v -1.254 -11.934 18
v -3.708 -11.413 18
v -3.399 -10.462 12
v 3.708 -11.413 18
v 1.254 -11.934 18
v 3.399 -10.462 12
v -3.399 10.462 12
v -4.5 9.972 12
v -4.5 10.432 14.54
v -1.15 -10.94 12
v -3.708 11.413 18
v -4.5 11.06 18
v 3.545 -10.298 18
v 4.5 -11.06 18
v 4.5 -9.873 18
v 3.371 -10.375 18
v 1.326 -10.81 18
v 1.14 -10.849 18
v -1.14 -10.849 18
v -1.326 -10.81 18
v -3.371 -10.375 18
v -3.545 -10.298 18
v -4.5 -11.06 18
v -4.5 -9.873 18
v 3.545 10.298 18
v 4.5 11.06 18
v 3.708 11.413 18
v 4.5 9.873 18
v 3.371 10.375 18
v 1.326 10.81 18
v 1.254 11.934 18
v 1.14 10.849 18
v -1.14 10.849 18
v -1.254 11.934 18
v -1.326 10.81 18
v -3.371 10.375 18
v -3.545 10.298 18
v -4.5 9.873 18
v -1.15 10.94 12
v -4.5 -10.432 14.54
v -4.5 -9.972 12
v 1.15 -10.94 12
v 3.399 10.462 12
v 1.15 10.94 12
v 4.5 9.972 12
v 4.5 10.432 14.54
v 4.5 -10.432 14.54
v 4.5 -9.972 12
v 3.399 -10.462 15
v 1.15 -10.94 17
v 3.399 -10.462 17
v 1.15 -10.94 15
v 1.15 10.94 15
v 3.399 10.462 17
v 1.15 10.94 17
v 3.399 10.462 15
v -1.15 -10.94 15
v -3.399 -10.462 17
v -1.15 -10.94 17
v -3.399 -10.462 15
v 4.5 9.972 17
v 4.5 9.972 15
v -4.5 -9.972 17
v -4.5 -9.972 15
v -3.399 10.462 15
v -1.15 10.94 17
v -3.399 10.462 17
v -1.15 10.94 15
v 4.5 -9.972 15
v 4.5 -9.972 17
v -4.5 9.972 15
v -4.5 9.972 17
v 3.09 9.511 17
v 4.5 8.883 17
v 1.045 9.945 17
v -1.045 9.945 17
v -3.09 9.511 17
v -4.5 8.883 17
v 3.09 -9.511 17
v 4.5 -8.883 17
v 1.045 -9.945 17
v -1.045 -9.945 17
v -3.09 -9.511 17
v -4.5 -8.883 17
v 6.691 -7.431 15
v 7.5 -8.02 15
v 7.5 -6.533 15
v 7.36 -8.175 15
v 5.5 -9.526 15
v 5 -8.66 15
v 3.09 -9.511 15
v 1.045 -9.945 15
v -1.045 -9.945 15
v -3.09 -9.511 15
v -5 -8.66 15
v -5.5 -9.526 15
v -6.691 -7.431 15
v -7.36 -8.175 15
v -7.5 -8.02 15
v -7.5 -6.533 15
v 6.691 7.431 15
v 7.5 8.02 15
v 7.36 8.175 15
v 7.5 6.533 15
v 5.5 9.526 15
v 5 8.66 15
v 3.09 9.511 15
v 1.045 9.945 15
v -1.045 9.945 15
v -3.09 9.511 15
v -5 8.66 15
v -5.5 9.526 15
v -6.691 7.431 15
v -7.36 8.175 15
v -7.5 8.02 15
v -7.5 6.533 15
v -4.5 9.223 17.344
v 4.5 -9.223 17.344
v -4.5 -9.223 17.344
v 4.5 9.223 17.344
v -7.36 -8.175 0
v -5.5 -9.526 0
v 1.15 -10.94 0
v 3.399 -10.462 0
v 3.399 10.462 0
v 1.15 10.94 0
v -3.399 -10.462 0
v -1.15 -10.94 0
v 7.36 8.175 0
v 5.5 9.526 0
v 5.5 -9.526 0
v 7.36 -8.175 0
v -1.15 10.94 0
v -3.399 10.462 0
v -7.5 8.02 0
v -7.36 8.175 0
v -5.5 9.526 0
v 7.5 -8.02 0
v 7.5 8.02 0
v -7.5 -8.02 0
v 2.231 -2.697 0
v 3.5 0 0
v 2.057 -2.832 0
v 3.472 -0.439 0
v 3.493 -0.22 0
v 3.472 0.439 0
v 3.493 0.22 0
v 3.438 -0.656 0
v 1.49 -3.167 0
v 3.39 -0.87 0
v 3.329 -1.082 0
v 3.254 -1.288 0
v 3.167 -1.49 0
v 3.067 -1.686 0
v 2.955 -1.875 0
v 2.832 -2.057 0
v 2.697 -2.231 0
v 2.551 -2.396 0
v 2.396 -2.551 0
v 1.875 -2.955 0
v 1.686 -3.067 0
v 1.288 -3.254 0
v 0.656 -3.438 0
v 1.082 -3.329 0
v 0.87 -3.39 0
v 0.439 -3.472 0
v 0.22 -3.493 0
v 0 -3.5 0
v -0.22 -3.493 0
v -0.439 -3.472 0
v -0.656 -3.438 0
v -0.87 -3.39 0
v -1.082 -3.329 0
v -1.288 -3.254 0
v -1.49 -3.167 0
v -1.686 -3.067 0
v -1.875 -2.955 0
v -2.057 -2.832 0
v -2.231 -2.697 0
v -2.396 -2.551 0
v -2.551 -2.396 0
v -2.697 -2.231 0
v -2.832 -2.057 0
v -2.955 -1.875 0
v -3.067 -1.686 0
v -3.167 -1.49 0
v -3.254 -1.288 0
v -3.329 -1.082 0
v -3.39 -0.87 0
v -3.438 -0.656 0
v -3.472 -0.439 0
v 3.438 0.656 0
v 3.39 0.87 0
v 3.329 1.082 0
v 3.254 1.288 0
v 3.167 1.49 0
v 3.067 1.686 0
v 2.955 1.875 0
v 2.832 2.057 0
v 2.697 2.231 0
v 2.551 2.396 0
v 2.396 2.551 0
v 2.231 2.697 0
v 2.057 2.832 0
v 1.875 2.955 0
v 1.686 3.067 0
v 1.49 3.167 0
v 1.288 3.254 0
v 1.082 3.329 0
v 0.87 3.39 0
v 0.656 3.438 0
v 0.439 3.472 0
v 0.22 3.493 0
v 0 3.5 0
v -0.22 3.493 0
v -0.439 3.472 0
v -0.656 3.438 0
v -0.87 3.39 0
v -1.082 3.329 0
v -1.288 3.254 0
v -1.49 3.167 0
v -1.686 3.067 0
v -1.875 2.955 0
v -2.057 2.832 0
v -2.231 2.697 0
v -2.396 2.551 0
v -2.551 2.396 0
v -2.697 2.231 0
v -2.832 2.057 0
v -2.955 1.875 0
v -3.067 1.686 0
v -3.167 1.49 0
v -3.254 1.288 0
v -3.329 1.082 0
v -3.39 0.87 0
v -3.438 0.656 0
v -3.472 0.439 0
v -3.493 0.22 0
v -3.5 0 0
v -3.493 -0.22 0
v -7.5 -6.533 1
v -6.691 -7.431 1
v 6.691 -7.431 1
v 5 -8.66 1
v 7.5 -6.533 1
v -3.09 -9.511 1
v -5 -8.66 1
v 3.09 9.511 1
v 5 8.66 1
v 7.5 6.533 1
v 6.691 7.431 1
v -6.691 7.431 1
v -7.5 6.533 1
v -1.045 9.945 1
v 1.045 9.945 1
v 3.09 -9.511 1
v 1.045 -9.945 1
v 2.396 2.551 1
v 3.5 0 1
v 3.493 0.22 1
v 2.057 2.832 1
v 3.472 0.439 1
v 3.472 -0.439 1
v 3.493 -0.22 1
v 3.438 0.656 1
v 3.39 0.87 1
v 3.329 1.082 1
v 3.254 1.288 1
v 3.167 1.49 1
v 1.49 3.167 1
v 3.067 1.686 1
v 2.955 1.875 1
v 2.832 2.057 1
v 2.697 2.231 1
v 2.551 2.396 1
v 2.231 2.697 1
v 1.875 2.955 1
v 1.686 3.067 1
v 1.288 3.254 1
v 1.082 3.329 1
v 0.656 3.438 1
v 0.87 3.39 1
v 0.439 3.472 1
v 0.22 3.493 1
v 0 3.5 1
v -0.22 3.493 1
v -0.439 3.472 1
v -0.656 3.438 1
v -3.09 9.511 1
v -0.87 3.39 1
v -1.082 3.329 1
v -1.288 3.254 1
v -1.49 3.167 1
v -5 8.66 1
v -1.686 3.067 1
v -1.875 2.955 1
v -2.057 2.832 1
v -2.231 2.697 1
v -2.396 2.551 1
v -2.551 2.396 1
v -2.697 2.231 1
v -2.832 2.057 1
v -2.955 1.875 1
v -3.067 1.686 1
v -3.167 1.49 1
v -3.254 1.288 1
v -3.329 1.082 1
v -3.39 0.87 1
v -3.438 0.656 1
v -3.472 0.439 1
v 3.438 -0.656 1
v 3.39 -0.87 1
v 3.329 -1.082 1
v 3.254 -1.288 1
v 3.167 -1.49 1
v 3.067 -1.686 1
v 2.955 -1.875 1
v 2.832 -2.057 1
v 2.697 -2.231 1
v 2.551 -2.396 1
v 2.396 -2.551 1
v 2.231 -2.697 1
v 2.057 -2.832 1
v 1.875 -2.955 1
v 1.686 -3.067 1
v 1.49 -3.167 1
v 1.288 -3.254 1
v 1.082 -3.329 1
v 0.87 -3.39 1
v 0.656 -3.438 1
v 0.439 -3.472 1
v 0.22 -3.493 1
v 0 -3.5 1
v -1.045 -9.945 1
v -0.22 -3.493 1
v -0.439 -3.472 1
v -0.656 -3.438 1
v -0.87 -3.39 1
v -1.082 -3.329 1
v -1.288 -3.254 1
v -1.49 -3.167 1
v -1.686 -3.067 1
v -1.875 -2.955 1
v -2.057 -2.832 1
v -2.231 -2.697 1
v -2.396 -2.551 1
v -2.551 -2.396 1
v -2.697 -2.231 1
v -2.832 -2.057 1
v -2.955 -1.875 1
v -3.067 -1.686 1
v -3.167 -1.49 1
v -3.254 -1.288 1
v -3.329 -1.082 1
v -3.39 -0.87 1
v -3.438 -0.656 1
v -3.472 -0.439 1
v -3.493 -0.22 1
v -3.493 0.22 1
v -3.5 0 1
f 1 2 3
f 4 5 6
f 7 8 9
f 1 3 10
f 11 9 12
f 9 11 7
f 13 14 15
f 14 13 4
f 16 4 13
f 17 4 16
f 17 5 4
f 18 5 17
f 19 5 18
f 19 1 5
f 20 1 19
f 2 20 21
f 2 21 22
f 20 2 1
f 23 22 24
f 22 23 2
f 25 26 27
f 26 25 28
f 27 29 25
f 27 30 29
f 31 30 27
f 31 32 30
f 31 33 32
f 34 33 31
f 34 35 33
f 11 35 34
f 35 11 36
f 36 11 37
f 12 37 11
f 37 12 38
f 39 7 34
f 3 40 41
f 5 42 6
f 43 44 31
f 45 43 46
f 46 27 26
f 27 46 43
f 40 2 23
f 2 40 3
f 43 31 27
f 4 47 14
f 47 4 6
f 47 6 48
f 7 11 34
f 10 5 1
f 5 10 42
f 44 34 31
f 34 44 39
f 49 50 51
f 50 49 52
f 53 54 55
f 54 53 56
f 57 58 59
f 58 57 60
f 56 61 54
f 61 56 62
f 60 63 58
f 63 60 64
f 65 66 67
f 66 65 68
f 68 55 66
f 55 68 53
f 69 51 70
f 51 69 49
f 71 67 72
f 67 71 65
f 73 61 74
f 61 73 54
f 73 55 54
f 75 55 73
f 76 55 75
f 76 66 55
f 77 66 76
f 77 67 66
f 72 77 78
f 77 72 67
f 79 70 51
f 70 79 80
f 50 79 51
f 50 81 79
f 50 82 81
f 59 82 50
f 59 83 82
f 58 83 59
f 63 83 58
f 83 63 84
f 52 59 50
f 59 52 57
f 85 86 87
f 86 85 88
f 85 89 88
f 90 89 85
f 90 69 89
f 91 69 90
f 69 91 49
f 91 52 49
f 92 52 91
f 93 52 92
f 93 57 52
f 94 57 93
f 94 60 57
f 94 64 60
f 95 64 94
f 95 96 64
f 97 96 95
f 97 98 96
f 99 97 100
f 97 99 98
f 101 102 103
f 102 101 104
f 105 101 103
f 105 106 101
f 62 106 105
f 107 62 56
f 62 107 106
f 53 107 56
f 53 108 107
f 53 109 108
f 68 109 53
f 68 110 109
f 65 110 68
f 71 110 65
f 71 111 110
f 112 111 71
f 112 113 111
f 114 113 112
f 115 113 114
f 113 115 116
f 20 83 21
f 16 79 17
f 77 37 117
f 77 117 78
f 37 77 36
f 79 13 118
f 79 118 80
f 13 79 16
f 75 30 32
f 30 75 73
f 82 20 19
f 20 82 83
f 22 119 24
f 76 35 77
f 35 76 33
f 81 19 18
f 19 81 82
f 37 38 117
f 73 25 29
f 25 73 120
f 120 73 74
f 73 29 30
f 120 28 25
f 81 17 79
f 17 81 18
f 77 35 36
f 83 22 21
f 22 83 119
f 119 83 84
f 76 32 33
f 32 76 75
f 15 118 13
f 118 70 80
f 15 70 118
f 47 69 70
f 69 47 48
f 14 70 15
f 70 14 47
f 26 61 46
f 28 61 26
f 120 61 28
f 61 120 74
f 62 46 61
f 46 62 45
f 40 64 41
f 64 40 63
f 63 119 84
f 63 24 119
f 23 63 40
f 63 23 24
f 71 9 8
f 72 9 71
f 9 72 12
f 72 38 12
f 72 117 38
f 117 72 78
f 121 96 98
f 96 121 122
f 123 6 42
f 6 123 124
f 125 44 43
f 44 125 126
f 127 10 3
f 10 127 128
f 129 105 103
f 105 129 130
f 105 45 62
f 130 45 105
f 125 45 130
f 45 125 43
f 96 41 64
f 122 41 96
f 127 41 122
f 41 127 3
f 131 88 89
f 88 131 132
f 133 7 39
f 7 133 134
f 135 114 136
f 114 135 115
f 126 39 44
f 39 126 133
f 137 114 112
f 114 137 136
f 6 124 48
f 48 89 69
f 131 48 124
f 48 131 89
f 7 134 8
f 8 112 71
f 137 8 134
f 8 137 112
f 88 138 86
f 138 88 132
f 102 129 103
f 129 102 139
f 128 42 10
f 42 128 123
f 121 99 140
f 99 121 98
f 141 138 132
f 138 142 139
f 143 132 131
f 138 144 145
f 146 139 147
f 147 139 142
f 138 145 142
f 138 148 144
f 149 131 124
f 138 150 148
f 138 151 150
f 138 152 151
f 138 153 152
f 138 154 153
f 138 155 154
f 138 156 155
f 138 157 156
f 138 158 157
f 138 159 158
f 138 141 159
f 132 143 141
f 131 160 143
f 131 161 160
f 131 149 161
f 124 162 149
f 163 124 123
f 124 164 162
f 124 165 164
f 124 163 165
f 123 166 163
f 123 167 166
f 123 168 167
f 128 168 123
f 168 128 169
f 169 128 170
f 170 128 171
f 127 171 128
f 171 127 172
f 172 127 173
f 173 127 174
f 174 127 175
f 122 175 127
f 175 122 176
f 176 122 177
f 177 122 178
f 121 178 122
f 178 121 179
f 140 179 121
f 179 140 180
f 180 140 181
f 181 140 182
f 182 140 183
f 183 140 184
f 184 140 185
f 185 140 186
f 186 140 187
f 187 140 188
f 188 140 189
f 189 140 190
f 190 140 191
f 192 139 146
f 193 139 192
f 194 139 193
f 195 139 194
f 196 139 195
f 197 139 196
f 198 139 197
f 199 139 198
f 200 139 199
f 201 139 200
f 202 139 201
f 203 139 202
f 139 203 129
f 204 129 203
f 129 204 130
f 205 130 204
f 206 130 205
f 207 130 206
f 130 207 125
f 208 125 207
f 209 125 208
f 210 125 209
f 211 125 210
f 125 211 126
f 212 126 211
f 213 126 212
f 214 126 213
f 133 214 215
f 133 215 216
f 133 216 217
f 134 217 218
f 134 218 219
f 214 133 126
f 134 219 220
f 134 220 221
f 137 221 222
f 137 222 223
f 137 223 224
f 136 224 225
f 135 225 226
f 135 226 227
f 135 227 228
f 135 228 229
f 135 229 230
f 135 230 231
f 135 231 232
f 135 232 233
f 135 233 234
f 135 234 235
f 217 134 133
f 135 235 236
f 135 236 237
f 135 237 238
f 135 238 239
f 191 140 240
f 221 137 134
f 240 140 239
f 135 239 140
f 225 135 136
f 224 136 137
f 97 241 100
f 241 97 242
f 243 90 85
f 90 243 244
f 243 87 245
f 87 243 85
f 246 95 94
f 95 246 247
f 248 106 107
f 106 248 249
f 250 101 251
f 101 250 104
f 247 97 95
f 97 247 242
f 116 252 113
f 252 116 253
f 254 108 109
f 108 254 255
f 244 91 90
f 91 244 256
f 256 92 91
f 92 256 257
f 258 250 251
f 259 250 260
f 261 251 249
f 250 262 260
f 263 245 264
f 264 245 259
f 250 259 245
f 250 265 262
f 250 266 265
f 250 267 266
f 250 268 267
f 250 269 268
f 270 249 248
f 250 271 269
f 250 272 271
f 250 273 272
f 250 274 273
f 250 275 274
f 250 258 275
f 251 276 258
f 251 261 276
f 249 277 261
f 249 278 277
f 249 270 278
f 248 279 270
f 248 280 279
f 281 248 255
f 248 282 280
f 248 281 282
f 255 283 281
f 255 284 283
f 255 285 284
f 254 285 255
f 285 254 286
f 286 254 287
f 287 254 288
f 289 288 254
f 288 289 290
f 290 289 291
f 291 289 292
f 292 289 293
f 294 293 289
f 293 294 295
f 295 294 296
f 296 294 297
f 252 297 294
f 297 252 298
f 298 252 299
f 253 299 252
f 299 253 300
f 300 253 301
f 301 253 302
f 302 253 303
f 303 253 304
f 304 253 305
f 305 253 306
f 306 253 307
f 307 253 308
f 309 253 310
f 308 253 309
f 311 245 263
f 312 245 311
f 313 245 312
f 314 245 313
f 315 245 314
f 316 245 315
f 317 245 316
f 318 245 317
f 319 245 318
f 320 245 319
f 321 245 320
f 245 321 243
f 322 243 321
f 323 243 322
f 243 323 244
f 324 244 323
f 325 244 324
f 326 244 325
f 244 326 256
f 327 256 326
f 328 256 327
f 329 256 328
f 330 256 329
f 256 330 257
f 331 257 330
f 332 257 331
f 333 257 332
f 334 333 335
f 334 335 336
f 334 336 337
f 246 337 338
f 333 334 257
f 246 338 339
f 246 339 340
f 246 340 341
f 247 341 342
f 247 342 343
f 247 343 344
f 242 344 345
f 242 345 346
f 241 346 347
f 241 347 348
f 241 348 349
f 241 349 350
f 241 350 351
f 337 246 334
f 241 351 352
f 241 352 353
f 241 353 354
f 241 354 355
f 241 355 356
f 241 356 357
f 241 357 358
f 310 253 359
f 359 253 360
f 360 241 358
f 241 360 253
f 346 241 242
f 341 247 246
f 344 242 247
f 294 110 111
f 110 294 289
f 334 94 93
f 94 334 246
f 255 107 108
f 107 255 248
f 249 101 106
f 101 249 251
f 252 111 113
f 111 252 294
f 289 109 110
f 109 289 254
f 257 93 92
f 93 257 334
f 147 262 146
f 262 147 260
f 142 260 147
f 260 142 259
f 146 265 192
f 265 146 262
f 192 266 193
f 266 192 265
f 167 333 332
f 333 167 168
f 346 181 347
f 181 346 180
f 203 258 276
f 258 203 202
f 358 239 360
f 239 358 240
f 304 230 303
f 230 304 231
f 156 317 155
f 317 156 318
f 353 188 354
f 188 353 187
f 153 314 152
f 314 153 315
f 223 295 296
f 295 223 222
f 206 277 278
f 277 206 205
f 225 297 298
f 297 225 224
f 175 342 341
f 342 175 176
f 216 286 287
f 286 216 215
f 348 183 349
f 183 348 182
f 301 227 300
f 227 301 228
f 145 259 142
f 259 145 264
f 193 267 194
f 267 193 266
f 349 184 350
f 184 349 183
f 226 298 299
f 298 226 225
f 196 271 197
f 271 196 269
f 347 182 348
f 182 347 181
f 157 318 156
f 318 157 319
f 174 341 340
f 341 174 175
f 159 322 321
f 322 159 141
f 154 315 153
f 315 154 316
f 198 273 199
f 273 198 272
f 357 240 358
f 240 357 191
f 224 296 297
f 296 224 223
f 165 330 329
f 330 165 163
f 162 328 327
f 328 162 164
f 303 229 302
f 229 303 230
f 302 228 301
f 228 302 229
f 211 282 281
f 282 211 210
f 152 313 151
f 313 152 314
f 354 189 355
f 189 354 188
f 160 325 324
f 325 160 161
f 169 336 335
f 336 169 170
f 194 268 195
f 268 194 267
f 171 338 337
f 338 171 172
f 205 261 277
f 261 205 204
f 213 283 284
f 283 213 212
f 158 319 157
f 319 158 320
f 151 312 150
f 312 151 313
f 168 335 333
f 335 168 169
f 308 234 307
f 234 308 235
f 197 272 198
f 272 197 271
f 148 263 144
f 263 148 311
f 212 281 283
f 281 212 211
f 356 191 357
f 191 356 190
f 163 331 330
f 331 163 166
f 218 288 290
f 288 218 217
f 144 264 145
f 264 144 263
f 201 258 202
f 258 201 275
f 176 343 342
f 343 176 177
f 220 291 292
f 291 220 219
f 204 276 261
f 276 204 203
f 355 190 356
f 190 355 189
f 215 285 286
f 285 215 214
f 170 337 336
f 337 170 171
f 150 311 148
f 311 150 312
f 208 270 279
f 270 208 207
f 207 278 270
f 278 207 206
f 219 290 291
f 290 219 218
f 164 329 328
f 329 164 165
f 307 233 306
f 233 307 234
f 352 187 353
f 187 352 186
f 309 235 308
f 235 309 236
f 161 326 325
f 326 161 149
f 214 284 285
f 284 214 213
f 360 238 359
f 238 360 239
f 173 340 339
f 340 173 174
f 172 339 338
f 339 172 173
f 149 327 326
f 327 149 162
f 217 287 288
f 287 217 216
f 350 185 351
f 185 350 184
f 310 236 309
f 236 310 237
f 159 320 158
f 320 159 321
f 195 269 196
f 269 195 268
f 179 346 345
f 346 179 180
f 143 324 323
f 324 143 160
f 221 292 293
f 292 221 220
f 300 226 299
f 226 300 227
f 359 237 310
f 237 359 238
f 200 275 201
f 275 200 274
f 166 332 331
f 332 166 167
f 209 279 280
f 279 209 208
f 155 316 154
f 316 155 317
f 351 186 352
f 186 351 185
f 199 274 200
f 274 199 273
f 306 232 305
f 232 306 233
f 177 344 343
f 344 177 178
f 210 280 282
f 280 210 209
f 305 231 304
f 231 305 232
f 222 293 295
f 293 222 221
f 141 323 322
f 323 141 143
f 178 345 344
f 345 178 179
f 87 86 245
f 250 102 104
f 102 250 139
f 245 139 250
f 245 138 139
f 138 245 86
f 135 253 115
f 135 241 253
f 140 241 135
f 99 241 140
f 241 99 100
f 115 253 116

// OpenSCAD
module TopMotorMount(){
    difference(){
        union(){
            cylinder(15, 11,11);
            translate([0,0,12]) {
                intersection(){
                    difference(){
                        cylinder(6,11,12);
                        translate([0,0,3]){
                            cylinder(2, 11,11);
                        }
                        translate([0,0,5]){
                            cylinder(1.1, 10,11);
                        }
                    }
                    translate([-4.5,-50,0]){
                        cube([9,100,100]);
                    }
                }

            }
        }
        
        
        translate([0,0,1
        ]){
            cylinder(30,10,10);
        }
        translate([0,0,-1]){
                cylinder(15, 3.5,3.5, $fn = 100);
        }
        translate([7.5,-11,-1]){
            cube([8, 22,20]);
        }
        rotate([0,0,180]){
            translate([7.5,-11,-1]){
                cube([8, 22,20]);
            }
        }
    }
}

TopMotorMount();
